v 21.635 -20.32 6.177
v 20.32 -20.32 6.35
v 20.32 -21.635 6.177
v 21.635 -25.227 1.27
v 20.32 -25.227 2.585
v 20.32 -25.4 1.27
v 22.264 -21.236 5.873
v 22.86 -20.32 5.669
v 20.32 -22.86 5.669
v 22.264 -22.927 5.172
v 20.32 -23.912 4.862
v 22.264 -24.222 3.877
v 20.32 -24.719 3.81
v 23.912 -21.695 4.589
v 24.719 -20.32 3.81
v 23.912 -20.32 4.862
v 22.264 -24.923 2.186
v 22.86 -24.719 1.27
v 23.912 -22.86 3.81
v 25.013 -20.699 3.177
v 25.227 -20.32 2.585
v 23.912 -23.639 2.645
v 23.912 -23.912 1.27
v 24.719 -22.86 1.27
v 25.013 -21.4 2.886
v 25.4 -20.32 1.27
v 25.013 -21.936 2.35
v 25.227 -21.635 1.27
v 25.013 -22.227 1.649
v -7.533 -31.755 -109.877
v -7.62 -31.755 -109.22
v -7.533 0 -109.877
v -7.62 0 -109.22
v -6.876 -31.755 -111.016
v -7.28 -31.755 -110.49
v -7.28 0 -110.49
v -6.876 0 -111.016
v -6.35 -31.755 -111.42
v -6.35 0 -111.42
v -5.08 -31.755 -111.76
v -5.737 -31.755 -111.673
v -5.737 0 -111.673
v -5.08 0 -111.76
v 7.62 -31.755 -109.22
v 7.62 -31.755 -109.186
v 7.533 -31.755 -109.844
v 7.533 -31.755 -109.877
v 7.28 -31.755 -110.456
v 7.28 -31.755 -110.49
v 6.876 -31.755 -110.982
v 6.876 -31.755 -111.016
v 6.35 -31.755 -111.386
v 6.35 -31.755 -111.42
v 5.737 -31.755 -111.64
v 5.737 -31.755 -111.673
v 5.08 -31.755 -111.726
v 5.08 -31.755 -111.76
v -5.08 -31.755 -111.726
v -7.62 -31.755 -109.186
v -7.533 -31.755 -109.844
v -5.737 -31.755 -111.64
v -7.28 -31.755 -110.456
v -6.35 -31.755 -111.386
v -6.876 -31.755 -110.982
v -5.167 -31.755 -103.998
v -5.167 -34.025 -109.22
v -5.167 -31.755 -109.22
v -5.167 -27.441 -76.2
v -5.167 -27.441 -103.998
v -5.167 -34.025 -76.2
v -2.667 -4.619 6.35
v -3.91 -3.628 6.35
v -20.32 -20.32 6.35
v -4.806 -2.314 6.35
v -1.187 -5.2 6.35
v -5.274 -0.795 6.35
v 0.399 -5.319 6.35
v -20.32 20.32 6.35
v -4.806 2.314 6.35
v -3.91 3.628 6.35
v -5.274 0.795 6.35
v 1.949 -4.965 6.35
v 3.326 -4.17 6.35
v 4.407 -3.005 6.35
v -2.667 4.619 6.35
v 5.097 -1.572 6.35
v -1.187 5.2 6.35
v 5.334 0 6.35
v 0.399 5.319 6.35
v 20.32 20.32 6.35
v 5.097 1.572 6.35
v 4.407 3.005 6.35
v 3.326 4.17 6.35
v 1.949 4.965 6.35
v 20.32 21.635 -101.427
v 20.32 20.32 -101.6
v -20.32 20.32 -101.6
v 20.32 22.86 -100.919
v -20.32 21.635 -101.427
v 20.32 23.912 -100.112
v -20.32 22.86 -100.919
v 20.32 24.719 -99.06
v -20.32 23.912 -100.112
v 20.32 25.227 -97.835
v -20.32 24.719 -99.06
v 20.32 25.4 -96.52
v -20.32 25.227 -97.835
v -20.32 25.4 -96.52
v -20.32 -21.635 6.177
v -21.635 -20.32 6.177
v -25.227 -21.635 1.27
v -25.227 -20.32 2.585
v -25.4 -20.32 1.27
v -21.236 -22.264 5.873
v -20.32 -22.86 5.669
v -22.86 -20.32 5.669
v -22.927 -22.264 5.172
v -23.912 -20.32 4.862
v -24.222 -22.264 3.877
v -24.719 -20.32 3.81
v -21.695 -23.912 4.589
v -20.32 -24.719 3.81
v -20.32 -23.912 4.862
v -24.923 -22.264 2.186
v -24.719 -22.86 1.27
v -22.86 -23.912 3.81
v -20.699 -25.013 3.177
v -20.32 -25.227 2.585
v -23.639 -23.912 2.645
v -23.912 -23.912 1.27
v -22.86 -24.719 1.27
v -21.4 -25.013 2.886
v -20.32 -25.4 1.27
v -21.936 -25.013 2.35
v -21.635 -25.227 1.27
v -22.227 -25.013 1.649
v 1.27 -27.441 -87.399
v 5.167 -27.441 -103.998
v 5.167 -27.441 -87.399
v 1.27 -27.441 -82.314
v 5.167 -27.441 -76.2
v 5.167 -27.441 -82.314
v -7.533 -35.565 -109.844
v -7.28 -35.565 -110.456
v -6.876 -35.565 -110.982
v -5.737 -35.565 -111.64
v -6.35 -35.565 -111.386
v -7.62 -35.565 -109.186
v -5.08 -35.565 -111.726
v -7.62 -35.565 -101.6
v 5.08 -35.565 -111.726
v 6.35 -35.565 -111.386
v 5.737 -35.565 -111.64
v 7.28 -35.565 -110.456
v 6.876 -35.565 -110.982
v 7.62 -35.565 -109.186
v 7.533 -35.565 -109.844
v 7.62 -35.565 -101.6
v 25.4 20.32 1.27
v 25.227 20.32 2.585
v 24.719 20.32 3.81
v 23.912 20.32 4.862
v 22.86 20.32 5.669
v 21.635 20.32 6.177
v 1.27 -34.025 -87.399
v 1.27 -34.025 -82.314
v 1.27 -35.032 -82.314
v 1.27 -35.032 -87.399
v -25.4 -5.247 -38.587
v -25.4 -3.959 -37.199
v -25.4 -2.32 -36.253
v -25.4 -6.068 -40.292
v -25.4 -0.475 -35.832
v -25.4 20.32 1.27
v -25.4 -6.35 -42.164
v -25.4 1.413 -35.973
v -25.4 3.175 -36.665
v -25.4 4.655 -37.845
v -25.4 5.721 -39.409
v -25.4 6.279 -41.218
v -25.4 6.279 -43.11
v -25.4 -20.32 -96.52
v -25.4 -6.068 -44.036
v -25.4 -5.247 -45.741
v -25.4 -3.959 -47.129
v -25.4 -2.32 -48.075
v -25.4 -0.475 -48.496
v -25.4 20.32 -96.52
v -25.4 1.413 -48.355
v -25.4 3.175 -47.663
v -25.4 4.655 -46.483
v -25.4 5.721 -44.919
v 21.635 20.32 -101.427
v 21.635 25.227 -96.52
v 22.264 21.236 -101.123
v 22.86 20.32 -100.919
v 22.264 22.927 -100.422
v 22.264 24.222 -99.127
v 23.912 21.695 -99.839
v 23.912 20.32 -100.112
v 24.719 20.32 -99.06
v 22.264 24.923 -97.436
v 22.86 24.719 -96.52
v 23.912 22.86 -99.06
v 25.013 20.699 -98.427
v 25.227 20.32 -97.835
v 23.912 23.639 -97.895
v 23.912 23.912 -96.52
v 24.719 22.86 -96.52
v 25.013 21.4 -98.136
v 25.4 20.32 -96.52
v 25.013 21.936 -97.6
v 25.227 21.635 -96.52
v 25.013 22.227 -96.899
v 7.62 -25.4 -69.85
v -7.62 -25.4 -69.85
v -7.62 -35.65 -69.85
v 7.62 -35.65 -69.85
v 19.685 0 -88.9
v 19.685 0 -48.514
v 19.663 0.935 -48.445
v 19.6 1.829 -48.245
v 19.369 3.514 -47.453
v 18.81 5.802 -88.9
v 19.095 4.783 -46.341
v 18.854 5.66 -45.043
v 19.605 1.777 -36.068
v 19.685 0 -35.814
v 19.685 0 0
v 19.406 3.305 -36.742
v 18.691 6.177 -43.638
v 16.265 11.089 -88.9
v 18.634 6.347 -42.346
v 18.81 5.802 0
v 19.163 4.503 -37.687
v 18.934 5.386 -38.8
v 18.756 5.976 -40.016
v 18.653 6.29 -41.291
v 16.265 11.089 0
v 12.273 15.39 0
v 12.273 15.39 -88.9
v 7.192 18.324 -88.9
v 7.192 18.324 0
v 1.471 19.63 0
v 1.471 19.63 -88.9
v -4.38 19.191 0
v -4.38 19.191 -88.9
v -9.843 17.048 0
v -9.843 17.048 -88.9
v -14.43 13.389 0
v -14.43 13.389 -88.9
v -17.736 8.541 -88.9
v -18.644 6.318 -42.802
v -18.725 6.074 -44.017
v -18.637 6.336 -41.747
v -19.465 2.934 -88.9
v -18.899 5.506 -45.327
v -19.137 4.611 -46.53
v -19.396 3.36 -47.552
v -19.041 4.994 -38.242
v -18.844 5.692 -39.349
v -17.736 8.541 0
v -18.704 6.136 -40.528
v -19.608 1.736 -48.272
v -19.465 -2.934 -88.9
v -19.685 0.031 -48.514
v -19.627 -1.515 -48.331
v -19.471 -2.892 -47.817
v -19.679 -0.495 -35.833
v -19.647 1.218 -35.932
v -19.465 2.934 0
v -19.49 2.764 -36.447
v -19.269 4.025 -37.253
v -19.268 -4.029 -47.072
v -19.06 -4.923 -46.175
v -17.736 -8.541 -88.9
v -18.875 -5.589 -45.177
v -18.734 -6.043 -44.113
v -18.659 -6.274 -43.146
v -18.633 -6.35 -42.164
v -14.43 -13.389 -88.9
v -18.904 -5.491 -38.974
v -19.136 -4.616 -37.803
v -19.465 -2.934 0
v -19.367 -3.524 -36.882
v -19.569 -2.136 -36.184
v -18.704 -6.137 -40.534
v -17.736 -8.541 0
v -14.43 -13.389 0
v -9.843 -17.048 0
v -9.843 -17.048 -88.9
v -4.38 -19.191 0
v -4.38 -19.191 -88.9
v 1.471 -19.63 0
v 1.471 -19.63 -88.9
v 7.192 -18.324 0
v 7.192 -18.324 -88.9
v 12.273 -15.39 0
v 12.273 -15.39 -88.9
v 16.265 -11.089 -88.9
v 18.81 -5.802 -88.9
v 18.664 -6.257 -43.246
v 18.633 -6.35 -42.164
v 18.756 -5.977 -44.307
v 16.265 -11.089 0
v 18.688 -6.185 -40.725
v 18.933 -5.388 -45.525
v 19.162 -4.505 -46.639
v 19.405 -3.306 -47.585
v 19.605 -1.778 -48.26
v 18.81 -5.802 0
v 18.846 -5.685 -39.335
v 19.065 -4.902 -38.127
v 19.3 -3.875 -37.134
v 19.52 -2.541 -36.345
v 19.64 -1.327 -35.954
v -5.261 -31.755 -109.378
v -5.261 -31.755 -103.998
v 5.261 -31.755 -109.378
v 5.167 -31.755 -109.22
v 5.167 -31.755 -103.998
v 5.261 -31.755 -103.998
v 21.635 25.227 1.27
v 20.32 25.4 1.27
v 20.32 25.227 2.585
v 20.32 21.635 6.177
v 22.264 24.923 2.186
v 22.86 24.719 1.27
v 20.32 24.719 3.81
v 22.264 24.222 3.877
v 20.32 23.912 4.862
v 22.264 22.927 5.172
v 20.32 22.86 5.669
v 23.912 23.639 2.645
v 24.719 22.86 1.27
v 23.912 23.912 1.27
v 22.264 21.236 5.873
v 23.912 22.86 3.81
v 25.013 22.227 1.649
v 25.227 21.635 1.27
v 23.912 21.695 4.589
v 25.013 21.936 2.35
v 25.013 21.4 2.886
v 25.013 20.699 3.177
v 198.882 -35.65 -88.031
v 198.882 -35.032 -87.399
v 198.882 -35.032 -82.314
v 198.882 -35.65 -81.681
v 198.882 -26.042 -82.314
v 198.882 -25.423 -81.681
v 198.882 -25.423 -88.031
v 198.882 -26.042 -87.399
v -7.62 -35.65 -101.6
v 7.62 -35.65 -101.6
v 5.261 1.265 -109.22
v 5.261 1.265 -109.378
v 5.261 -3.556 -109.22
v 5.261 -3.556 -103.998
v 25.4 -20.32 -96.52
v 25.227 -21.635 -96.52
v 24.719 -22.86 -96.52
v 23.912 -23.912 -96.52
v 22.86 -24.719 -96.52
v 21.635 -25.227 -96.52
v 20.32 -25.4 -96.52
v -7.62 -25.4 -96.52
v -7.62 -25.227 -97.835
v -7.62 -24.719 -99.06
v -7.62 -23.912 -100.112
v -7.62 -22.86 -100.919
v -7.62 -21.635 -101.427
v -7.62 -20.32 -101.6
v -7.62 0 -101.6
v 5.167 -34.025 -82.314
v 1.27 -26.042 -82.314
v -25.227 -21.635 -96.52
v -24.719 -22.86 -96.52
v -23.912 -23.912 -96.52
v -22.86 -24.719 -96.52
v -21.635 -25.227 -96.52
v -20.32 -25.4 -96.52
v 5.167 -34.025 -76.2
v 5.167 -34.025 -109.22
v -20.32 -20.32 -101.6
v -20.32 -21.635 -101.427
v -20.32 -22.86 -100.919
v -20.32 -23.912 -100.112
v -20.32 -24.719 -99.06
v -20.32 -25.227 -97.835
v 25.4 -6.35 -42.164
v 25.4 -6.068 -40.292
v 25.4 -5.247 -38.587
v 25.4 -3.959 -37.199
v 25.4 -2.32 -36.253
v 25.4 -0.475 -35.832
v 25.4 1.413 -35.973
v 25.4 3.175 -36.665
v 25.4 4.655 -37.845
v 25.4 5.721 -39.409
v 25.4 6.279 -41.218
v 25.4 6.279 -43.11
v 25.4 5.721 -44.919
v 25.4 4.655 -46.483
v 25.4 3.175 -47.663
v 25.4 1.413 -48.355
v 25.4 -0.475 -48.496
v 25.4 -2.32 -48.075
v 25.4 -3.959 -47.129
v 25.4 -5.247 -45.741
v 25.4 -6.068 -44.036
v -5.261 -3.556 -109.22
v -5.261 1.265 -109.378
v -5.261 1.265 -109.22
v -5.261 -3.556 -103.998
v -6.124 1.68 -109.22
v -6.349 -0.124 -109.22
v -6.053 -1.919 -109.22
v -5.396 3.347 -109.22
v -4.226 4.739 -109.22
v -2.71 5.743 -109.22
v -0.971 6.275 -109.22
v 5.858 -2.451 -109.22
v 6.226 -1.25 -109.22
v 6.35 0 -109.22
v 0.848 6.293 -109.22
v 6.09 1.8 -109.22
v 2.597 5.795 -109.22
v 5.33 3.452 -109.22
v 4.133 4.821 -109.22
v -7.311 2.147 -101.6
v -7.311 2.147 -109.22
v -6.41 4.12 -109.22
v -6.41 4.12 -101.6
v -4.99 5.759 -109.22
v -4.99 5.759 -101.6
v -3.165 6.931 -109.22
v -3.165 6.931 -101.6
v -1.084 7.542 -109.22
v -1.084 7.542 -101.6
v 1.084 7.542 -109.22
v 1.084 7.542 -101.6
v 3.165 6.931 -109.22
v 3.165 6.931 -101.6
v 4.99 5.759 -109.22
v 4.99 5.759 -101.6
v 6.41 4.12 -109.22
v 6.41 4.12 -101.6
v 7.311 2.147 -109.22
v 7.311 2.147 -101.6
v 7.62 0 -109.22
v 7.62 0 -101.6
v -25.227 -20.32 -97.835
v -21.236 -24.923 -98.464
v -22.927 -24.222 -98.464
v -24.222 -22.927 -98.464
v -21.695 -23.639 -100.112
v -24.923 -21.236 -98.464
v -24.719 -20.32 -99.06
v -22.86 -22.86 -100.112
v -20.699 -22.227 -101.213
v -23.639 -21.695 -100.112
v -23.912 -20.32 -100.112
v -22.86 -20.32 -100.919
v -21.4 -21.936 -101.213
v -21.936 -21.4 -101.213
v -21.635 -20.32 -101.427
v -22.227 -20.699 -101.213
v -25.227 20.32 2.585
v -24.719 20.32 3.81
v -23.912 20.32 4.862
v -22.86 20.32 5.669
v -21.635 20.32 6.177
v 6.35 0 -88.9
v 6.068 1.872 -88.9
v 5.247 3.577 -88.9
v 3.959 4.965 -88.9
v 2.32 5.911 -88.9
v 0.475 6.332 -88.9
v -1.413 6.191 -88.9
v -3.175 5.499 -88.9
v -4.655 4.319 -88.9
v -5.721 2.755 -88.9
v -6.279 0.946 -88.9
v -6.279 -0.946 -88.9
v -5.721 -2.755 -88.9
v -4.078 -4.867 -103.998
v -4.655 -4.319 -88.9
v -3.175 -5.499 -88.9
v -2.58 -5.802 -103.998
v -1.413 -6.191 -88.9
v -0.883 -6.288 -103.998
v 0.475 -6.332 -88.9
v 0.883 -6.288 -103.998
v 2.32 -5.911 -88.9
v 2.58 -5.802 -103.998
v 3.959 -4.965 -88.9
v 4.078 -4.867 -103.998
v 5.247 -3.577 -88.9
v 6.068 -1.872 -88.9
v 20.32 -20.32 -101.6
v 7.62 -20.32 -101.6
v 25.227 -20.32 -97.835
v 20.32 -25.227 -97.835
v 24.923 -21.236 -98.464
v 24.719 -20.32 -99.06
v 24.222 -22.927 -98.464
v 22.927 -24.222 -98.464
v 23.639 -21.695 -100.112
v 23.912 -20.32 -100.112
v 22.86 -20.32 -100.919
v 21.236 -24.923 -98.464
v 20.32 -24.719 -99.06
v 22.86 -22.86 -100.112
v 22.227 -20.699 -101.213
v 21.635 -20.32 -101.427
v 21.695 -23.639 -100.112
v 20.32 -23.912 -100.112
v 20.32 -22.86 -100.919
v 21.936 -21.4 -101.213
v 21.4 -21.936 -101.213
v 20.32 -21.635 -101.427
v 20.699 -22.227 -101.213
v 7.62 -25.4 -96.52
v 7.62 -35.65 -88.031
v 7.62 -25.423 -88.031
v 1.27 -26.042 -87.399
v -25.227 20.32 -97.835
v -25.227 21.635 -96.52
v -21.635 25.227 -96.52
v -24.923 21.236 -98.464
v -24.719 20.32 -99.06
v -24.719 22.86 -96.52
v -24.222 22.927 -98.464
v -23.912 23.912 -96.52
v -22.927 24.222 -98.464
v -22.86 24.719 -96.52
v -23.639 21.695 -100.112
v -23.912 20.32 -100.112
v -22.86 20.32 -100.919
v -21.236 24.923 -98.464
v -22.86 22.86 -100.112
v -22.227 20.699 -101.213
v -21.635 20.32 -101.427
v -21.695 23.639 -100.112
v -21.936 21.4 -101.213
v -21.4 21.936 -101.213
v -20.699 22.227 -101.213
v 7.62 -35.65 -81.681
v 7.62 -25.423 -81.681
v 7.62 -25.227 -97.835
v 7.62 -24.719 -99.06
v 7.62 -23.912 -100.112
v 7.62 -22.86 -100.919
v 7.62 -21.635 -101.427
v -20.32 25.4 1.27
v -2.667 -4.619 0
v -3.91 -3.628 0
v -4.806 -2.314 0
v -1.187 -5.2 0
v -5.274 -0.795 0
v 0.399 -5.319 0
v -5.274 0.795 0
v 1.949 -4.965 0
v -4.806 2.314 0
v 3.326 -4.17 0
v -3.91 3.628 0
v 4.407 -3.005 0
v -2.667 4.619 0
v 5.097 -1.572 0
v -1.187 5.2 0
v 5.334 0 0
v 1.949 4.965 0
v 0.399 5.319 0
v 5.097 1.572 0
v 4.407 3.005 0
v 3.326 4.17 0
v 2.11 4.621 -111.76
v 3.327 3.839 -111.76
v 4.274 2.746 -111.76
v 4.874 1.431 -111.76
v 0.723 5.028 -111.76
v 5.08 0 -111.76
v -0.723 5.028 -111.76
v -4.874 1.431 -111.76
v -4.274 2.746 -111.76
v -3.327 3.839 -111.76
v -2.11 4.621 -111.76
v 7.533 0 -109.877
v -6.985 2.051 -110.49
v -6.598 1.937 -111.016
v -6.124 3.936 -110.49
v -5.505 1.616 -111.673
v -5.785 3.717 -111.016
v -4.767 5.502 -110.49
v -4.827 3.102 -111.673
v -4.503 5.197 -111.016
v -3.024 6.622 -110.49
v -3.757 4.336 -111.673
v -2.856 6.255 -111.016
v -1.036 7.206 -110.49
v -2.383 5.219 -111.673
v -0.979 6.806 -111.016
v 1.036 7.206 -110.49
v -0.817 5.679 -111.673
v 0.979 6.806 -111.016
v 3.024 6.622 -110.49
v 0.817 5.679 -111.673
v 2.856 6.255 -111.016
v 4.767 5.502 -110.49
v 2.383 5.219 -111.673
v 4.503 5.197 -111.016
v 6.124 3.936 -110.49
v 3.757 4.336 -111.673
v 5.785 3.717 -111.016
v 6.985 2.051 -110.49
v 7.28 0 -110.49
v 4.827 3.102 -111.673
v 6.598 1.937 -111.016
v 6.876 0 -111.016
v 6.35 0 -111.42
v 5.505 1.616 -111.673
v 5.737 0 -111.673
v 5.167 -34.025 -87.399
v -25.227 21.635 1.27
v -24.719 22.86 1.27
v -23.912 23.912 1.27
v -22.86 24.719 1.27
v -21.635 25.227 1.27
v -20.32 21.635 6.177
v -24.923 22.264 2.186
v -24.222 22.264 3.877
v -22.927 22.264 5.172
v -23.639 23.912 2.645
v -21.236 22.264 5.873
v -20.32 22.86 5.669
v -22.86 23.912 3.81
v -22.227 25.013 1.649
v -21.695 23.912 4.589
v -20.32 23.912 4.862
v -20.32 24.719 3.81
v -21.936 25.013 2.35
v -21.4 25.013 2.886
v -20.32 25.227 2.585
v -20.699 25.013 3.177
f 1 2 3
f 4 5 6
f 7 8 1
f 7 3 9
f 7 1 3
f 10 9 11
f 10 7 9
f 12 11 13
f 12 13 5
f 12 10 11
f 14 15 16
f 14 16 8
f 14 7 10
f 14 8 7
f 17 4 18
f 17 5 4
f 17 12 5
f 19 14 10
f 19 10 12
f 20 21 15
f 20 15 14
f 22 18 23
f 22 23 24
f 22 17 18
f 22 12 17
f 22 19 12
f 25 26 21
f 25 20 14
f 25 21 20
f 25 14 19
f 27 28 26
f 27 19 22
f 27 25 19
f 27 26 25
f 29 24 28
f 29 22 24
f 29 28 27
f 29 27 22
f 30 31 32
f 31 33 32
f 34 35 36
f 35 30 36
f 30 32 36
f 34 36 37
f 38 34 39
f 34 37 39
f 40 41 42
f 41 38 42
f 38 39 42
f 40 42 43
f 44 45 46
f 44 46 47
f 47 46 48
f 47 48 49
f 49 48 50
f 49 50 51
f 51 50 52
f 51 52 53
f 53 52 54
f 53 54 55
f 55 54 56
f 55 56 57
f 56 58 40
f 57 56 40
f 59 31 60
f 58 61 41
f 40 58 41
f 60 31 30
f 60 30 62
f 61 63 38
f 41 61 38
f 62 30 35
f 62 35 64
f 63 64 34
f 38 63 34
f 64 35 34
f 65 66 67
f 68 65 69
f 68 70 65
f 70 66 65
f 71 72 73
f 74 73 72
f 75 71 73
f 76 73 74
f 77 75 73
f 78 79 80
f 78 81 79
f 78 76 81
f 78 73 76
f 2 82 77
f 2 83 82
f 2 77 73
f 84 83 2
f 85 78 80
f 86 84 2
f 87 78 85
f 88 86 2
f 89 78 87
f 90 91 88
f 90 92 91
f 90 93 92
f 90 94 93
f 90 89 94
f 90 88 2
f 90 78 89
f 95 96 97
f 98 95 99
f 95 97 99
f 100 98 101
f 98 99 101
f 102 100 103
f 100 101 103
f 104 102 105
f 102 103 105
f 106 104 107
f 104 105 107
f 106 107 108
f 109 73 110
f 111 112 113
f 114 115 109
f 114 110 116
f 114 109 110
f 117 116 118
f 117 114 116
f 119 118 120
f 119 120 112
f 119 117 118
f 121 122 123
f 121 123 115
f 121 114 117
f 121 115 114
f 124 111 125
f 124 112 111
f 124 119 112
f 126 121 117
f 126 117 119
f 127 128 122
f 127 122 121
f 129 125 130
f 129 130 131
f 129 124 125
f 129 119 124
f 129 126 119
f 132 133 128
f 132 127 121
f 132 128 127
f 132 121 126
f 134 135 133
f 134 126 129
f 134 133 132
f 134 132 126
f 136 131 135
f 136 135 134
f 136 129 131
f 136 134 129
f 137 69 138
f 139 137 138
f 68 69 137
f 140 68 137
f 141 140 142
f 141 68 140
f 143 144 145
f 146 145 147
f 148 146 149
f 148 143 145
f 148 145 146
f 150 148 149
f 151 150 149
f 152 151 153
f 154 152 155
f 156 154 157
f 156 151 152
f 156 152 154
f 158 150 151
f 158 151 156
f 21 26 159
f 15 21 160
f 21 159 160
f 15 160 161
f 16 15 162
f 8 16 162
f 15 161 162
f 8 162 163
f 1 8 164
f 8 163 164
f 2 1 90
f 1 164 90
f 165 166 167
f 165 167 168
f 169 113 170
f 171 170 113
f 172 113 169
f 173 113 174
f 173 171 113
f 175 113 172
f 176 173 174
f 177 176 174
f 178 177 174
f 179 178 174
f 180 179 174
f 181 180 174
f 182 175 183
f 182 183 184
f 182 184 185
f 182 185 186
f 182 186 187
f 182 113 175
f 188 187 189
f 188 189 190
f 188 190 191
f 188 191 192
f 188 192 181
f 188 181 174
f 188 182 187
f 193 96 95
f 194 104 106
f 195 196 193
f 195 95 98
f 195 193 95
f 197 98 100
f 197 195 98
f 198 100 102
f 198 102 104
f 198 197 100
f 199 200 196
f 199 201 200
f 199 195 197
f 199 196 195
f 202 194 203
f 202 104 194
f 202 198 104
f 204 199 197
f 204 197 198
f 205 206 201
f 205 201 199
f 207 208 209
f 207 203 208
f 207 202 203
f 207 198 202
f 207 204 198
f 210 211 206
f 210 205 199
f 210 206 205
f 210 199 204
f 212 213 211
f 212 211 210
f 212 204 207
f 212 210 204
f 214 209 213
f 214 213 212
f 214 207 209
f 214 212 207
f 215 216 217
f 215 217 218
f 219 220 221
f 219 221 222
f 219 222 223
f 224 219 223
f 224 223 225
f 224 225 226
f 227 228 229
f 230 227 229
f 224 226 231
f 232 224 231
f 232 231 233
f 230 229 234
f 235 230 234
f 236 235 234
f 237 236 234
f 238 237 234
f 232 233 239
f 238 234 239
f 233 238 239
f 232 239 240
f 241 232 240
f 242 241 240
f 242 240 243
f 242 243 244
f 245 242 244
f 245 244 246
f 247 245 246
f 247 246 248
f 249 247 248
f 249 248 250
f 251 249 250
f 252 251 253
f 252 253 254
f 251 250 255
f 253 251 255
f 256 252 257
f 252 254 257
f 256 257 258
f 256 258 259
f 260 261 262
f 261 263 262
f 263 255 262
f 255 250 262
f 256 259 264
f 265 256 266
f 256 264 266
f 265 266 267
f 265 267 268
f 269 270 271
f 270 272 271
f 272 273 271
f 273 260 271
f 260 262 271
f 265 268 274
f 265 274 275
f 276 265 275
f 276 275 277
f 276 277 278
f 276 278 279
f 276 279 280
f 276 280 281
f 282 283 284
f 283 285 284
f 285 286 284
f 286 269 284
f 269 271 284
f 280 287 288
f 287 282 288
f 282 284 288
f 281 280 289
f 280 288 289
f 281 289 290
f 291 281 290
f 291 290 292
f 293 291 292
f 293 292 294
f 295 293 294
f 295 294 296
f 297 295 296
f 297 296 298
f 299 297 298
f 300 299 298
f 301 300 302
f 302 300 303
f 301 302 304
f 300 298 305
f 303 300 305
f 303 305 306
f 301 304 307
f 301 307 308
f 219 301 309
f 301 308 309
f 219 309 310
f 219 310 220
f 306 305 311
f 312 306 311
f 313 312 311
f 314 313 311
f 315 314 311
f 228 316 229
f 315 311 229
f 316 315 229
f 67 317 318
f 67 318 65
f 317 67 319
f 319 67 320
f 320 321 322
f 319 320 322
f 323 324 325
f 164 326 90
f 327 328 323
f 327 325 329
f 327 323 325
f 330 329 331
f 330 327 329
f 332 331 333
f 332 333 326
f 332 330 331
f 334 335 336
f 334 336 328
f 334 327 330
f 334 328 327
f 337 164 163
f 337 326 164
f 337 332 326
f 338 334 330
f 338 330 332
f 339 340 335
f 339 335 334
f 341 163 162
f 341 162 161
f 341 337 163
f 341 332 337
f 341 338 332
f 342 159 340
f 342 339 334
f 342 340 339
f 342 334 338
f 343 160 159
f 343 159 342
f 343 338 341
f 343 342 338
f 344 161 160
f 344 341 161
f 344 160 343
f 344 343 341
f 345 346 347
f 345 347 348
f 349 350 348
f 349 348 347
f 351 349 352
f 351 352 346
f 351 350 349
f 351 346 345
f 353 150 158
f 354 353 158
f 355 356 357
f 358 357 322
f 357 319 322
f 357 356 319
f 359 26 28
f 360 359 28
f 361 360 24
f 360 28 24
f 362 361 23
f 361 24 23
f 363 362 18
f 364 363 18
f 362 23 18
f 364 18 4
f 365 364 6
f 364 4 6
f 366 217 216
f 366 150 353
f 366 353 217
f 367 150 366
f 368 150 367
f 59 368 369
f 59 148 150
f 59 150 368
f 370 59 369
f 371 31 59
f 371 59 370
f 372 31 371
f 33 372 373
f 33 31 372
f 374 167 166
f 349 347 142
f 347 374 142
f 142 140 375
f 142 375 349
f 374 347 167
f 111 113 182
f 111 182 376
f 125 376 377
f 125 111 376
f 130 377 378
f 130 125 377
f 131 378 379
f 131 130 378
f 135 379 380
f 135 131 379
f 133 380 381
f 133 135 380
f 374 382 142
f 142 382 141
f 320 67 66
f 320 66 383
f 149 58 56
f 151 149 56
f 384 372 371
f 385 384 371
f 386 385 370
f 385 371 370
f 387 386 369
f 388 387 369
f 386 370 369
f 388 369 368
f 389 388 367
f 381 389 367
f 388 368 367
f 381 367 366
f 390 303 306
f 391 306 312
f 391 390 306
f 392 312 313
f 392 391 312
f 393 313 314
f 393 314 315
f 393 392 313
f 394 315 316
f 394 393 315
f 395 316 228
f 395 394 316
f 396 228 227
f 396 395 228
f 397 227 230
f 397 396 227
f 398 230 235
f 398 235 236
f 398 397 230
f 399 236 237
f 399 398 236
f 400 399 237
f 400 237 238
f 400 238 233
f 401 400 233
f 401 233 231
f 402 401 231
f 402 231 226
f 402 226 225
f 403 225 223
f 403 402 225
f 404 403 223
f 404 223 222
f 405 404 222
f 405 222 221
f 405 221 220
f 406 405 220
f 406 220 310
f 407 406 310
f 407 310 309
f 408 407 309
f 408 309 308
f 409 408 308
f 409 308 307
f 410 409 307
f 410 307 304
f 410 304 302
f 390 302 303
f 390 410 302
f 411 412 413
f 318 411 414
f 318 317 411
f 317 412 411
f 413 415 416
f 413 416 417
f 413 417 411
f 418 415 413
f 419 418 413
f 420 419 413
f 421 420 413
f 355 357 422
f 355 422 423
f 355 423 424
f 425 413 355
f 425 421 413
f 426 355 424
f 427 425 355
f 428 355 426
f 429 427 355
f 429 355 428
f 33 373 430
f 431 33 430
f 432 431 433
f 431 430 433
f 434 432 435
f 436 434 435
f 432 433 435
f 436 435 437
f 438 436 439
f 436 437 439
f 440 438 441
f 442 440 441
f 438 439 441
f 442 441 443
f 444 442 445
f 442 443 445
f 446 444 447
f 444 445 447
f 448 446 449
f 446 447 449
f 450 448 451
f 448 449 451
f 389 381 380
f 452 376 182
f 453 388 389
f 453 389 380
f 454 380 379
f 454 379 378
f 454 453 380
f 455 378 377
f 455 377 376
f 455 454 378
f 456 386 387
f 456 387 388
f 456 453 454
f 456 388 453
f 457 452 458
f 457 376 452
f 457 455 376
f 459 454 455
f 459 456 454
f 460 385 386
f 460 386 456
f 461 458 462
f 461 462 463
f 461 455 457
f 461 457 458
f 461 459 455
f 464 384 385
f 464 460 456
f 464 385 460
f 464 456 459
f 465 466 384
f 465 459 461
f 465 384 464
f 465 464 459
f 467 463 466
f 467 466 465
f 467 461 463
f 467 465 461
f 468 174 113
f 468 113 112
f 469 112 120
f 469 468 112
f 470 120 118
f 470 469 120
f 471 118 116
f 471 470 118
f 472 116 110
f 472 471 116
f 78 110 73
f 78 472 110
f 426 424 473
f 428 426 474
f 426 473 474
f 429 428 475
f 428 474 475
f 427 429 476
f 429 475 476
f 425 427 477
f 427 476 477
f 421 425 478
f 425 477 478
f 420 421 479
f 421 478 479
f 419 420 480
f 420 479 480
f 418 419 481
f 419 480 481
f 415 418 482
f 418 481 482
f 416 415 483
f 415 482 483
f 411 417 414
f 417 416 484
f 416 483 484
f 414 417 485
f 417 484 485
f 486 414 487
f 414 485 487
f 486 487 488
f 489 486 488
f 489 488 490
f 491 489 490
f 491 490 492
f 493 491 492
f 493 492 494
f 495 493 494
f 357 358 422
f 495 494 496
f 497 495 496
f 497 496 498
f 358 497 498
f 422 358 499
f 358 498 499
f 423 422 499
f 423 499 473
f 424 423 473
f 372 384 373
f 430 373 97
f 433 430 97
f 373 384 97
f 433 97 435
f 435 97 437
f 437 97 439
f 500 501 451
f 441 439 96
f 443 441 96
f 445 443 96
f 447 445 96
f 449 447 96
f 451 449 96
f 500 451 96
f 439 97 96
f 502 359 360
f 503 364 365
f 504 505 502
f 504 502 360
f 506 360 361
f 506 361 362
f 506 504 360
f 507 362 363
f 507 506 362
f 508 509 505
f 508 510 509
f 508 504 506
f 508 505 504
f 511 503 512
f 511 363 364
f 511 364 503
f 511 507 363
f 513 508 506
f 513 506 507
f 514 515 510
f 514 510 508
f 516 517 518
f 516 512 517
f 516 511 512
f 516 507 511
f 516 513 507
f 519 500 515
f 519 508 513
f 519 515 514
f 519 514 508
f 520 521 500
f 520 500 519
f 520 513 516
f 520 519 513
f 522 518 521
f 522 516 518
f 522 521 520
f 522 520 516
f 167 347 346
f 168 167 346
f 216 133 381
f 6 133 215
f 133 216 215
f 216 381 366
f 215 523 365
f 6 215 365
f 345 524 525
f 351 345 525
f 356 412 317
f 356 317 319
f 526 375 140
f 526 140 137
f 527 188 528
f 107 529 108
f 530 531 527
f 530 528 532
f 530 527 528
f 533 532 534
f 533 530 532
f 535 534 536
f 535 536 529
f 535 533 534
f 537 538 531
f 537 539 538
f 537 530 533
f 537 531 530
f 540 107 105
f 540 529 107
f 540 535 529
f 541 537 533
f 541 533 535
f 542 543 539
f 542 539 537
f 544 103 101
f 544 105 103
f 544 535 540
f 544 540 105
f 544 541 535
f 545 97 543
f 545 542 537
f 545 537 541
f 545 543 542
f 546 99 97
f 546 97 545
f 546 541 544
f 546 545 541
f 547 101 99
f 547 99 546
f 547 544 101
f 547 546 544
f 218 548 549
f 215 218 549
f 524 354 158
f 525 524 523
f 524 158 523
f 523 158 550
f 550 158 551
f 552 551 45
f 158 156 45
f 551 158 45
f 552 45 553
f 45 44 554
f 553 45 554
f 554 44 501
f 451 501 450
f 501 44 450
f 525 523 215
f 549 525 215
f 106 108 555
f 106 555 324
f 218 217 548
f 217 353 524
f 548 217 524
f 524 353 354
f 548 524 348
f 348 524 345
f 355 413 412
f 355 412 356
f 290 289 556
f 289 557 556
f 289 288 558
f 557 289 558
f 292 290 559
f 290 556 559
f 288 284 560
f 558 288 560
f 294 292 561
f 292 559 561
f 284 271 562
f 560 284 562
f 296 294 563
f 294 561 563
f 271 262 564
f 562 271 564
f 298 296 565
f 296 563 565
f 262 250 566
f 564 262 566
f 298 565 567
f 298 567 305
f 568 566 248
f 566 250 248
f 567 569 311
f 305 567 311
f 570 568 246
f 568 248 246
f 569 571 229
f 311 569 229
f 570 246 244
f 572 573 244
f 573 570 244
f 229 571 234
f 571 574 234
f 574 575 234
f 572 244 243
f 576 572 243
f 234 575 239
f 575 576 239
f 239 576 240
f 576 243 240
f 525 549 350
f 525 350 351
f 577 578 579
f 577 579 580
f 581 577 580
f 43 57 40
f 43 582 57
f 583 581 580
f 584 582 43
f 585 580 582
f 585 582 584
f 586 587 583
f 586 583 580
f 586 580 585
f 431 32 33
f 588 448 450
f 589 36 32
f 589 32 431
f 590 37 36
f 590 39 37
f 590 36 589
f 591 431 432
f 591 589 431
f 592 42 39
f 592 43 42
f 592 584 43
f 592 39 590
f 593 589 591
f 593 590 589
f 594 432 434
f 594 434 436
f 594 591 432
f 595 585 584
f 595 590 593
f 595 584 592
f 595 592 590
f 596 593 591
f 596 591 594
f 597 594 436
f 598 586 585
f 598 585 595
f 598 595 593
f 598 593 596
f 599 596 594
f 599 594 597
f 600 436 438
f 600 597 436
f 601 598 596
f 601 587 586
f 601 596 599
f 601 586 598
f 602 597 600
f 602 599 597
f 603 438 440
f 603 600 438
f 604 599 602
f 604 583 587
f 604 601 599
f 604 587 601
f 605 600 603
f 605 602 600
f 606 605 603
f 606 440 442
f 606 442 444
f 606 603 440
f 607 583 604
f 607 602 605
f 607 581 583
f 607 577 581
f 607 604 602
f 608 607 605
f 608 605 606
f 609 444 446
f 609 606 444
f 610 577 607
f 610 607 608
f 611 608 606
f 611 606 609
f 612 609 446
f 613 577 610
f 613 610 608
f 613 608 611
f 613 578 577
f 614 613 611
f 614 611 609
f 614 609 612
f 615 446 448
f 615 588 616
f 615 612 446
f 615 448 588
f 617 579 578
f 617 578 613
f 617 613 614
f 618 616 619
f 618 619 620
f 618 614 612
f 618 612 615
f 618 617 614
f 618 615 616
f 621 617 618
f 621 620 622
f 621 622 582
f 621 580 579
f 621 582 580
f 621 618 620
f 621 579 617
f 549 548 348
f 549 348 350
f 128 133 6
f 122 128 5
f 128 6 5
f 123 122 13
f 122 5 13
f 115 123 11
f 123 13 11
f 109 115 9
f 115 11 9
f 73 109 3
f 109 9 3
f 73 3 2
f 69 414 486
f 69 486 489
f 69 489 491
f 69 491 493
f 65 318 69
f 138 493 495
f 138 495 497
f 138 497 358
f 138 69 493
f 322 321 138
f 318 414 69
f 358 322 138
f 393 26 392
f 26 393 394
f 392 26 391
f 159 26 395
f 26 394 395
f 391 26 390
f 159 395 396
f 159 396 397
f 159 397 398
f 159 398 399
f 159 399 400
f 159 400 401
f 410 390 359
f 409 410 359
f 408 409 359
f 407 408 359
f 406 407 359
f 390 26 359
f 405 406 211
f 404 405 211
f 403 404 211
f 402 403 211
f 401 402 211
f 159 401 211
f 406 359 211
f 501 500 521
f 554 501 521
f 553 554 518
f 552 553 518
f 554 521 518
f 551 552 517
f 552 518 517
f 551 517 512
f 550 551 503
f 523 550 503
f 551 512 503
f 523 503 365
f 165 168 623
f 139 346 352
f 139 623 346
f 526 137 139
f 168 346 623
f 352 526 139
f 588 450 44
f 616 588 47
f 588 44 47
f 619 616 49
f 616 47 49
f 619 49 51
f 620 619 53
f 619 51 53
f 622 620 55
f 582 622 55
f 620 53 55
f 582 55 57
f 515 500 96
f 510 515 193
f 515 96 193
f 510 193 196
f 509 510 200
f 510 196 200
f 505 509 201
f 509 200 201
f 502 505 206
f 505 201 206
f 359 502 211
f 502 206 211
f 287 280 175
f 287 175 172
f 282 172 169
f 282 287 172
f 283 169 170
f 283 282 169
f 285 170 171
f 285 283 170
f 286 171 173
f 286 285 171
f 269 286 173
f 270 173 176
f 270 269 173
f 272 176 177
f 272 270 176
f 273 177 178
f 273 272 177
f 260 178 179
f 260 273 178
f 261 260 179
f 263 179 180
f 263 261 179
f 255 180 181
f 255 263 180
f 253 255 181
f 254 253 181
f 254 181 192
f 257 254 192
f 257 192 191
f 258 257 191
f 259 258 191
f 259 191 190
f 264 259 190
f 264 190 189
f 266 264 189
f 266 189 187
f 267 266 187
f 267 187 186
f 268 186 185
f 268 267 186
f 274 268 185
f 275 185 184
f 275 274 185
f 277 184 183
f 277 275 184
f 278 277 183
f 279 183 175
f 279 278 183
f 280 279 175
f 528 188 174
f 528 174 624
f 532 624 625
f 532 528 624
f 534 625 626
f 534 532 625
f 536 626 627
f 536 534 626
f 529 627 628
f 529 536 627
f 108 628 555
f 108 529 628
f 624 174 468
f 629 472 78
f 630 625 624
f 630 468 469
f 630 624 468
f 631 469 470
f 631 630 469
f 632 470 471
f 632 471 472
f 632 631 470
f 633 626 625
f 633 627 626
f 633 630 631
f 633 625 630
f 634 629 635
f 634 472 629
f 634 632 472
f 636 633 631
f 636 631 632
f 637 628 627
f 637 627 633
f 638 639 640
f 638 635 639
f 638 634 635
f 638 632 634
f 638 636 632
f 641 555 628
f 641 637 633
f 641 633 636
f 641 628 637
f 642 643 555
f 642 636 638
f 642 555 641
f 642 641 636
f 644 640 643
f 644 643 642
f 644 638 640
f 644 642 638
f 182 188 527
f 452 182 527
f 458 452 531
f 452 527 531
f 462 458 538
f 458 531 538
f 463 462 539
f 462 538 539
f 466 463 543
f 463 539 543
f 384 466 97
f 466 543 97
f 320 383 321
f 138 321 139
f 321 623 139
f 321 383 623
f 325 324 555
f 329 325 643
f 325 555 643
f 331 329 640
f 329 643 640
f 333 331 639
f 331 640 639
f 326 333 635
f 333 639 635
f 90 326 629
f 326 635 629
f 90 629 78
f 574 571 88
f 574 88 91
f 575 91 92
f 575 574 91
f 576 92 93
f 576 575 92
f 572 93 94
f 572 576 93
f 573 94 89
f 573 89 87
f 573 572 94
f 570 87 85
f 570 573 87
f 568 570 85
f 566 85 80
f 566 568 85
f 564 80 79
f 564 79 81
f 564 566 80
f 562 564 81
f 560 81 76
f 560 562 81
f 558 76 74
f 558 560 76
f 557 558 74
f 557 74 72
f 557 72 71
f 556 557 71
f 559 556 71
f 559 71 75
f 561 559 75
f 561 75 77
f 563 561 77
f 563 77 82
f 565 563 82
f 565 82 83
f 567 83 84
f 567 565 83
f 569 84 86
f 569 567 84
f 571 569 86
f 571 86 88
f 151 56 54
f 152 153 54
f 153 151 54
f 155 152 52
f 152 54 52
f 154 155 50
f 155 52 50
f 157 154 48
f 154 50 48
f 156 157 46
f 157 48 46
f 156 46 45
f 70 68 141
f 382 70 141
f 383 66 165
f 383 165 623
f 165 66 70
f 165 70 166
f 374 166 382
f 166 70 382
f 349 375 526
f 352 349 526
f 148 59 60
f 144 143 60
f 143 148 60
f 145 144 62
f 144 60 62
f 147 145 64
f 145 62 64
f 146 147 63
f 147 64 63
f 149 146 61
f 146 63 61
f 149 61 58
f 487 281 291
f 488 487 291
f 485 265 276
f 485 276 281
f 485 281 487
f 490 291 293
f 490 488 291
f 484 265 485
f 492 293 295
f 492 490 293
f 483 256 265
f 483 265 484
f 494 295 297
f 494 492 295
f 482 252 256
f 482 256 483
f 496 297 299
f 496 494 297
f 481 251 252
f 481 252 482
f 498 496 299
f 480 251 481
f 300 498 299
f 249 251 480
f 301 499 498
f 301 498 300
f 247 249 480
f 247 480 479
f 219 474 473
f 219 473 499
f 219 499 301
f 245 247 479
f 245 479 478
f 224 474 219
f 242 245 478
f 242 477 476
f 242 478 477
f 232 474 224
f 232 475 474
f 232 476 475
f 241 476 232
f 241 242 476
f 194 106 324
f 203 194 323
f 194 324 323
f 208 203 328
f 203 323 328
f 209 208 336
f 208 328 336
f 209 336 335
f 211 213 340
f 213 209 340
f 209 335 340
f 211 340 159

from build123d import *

# Parameters (mm, degrees)
SKETCH1_W               = 50.8
SKETCH1_H               = 50.8
BOSS_EXTRUDE1_DEPTH     = 101.6
SKETCH3_R               = 19.685
CUT_EXTRUDE1_DEPTH      = 88.9
BOSS_EXTRUDE2_DEPTH     = 10.16
SKETCH11_R              = 6.35
CUT_EXTRUDE3_DEPTH      = 20.32
SKETCH13_W              = 50.8
SKETCH13_H              = 50.8
SKETCH13_R              = 5.334
BOSS_EXTRUDE4_DEPTH     = 6.35
FILLET2_R               = 5.08
FILLET5_R               = 2.54
CUT_EXTRUDE5_DEPTH      = 127.804196843
CUT_EXTRUDE5_DEPTH_BACK = 127.804196843
SKETCH14_R              = 6.35
FILLET8_R               = 5.08
FILLET10_R              = 5.08
FILLET11_R              = 5.08
FILLET12_R              = 5.08
FILLET13_R              = 5.08
SKETCH16_W              = 10.522080148
SKETCH16_H              = 5.380343577
CUT_EXTRUDE6_DEPTH      = 33.02
SKETCH23_W              = 15.24
SKETCH23_H              = 10.12633605
BOSS_EXTRUDE8_DEPTH     = 3.81
FILLET18_R              = 2.54
FILLET19_R              = 2.54
SKETCH24_W              = 15.24
SKETCH24_H              = 10.250014382
BOSS_EXTRUDE9_DEPTH     = 25.4
SKETCH25_W              = 10.33413659
SKETCH25_H              = 6.58364474
CUT_EXTRUDE9_DEPTH      = 33.02
SKETCH26_W              = 15.24
SKETCH26_H              = 10.250014382
BOSS_EXTRUDE10_DEPTH    = 6.35
SKETCH27_W              = 6.35
SKETCH27_H              = 10.22652942
SKETCH27_W_2            = 5.084647905
SKETCH27_H_2            = 8.990346269
BOSS_EXTRUDE11_DEPTH    = 191.262
SKETCH28_W              = 5.084647905
SKETCH28_H              = 8.990346269
CUT_EXTRUDE10_DEPTH     = 6.35


with BuildPart() as part:
    # Sketch1 → Boss-Extrude1 (new body)
    with BuildSketch(Plane.XY):
        Rectangle(SKETCH1_W, SKETCH1_H)
    extrude(amount=-BOSS_EXTRUDE1_DEPTH)

    # Sketch3 → Cut-Extrude1 (cut)
    with BuildSketch(Plane.XY):
        Circle(SKETCH3_R)
    extrude(amount=-CUT_EXTRUDE1_DEPTH, mode=Mode.SUBTRACT)

    # Sketch6 → Boss-Extrude2 (add)
    with BuildSketch(Plane(origin=(0, 0, -101.6), x_dir=(-1, 0, 0), z_dir=(0, 0, -1))):
        with BuildLine():
            Line((-7.62, 0), (-7.62, -25.404790774))
            Line((-7.62, -25.404790774), (-7.62, -31.754790774))
            Line((-7.62, -31.754790774), (7.62, -31.754790774))
            Line((7.62, -31.754790774), (7.62, -25.404790774))
            Line((7.62, -25.404790774), (7.62, 0))
            ThreePointArc((7.62, 0), (0, 7.62), (-7.62, 0))
        make_face()
    extrude(amount=BOSS_EXTRUDE2_DEPTH)

    # Sketch11 → Cut-Extrude3 (cut)
    with BuildSketch(Plane.XY.offset(-88.9)):
        Circle(SKETCH11_R)
    extrude(amount=-CUT_EXTRUDE3_DEPTH, mode=Mode.SUBTRACT)

    # Sketch13 → Boss-Extrude4 (add)
    with BuildSketch(Plane.XY):
        Rectangle(SKETCH13_W, SKETCH13_H)
        Circle(SKETCH13_R, mode=Mode.SUBTRACT)
    extrude(amount=BOSS_EXTRUDE4_DEPTH)

    # Fillet2
    fillet2_edges = [part.edges().sort_by_distance(p)[0] for p in [
        (-25.4, 0, -101.6),
        (-25.4, 0, 6.35),
        (-25.4, -25.4, -47.625),
        (-25.4, 25.4, -47.625),
    ]]
    fillet(fillet2_edges, radius=FILLET2_R)

    # Fillet5
    fillet5_edges = [part.edges().sort_by_distance(p)[0] for p in [
        (0, 7.62, -111.76),
        (7.62, -15.877395387, -111.76),
        (-7.62, -15.877395387, -111.76),
    ]]
    fillet(fillet5_edges, radius=FILLET5_R)

    # Sketch14 → Cut-Extrude5 (cut, two sides: drawn at the far end of the back side and taken through both)
    with BuildSketch(Plane.ZY.offset(25.4).offset(-CUT_EXTRUDE5_DEPTH_BACK)):
        with Locations(Location((-42.164, 0, 0), (0, 0, 270))):
            Circle(SKETCH14_R)
    extrude(amount=CUT_EXTRUDE5_DEPTH + CUT_EXTRUDE5_DEPTH_BACK, mode=Mode.SUBTRACT)

    # Fillet8
    # the kernel refuses this fillet: 5.08 mm, written as the material it takes off along each edge
    with BuildSketch(Plane(origin=(-20.32, -20.32, 1.27), x_dir=(0, 0, 1), z_dir=(0, -1, 0))) as fillet8_piece_1_section:
        Polygon((0, 0), (FILLET8_R, 0), (FILLET8_R, FILLET8_R), (0, FILLET8_R), align=None)
    fillet8_piece_1 = extrude(amount=FILLET8_R, mode=Mode.PRIVATE)
    fillet8_piece_1 = fillet8_piece_1 - Plane(origin=(-20.32, -20.32, 1.27), x_dir=(0.7071067811865475, 0, -0.7071067811865475), z_dir=(0, -1, 0)) * Sphere(FILLET8_R, mode=Mode.PRIVATE)
    add(fillet8_piece_1, mode=Mode.SUBTRACT)
    with BuildSketch(Plane(origin=(-20.32, 20.32, -96.52), x_dir=(0, 1, 0), z_dir=(0, 0, -1))) as fillet8_piece_2_section:
        Polygon((0, 0), (FILLET8_R, 0), (FILLET8_R, -FILLET8_R), (0, -FILLET8_R), align=None)
    fillet8_piece_2 = extrude(amount=FILLET8_R, mode=Mode.PRIVATE)
    fillet8_piece_2 = fillet8_piece_2 - Plane(origin=(-20.32, 20.32, -96.52), x_dir=(0.7071067811865476, -0.7071067811865475, 0), z_dir=(0, 0, -1)) * Sphere(FILLET8_R, mode=Mode.PRIVATE)
    add(fillet8_piece_2, mode=Mode.SUBTRACT)
    with BuildSketch(Plane(origin=(25.4, 38.1, -101.6), x_dir=(-1, 0, 0), z_dir=(0, -1, 0))) as fillet8_piece_3:
        with BuildLine():
            CenterArc((FILLET8_R, -FILLET8_R), FILLET8_R, 90, 90)
            Line((0, -FILLET8_R), (0, 0))
            Line((0, 0), (FILLET8_R, 0))
        make_face()
    extrude(amount=76.2, mode=Mode.SUBTRACT)
    with BuildSketch(Plane(origin=(38.1, -25.4, 6.35), x_dir=(0, 0, -1), z_dir=(-1, 0, 0)), Plane(origin=(-20.32, 25.4, -101.6), x_dir=(0, -1, 0), z_dir=(1, 0, 0))) as fillet8_piece_4:
        with BuildLine():
            CenterArc((FILLET8_R, -FILLET8_R), FILLET8_R, 90, 90)
            Line((0, -FILLET8_R), (0, 0))
            Line((0, 0), (FILLET8_R, 0))
        make_face()
    extrude(amount=58.42, mode=Mode.SUBTRACT)
    with BuildSketch(Plane(origin=(25.4, -25.4, 19.05), x_dir=(-1, 0, 0), z_dir=(0, 0, -1))) as fillet8_piece_5:
        with BuildLine():
            CenterArc((FILLET8_R, FILLET8_R), FILLET8_R, 180, 90)
            Line((0, FILLET8_R), (0, 0))
            Line((0, 0), (FILLET8_R, 0))
        make_face()
    extrude(amount=133.35, mode=Mode.SUBTRACT)

    # Fillet10
    # the kernel refuses this fillet: 5.08 mm, written as the material it takes off along each edge
    with BuildSketch(Plane(origin=(20.32, -20.32, 1.27), x_dir=(0, 0, 1), z_dir=(1, 0, 0))) as fillet10_piece_1_section:
        Polygon((0, 0), (FILLET10_R, 0), (FILLET10_R, FILLET10_R), (0, FILLET10_R), align=None)
    fillet10_piece_1 = extrude(amount=FILLET10_R, mode=Mode.PRIVATE)
    fillet10_piece_1 = fillet10_piece_1 - Plane(origin=(20.32, -20.32, 1.27), x_dir=(0, 0.7071067811865475, -0.7071067811865475), z_dir=(1, 0, 0)) * Sphere(FILLET10_R, mode=Mode.PRIVATE)
    add(fillet10_piece_1, mode=Mode.SUBTRACT)
    with BuildSketch(Plane(origin=(-20.32, 20.32, 1.27), x_dir=(0, 0, 1), z_dir=(0, 1, 0))) as fillet10_piece_2_section:
        Polygon((0, 0), (FILLET10_R, 0), (FILLET10_R, -FILLET10_R), (0, -FILLET10_R), align=None)
    fillet10_piece_2 = extrude(amount=FILLET10_R, mode=Mode.PRIVATE)
    fillet10_piece_2 = fillet10_piece_2 - Plane(origin=(-20.32, 20.32, 1.27), x_dir=(0.7071067811865475, 0, -0.7071067811865475), z_dir=(0, 1, 0)) * Sphere(FILLET10_R, mode=Mode.PRIVATE)
    add(fillet10_piece_2, mode=Mode.SUBTRACT)
    with BuildSketch(Plane(origin=(-20.32, 25.4, 6.35), x_dir=(0, 0, -1), z_dir=(1, 0, 0)), Plane(origin=(25.4, 38.1, 6.35), x_dir=(0, 0, -1), z_dir=(0, -1, 0))) as fillet10_piece_3:
        with BuildLine():
            CenterArc((FILLET10_R, -FILLET10_R), FILLET10_R, 90, 90)
            Line((0, -FILLET10_R), (0, 0))
            Line((0, 0), (FILLET10_R, 0))
        make_face()
    extrude(amount=58.42, mode=Mode.SUBTRACT)

    # Fillet11
    # the kernel refuses this fillet: 5.08 mm, written as the material it takes off along each edge
    with BuildSketch(Plane(origin=(20.32, 20.32, -96.52), x_dir=(0, 1, 0), z_dir=(1, 0, 0))) as fillet11_piece_1_section:
        Polygon((0, 0), (FILLET11_R, 0), (FILLET11_R, -FILLET11_R), (0, -FILLET11_R), align=None)
    fillet11_piece_1 = extrude(amount=FILLET11_R, mode=Mode.PRIVATE)
    fillet11_piece_1 = fillet11_piece_1 - Plane(origin=(20.32, 20.32, -96.52), x_dir=(0, -0.7071067811865475, 0.7071067811865475), z_dir=(1, 0, 0)) * Sphere(FILLET11_R, mode=Mode.PRIVATE)
    add(fillet11_piece_1, mode=Mode.SUBTRACT)
    with BuildSketch(Plane(origin=(20.32, 20.32, 1.27), x_dir=(0, 1, 0), z_dir=(1, 0, 0))) as fillet11_piece_2_section:
        Polygon((0, 0), (FILLET11_R, 0), (FILLET11_R, FILLET11_R), (0, FILLET11_R), align=None)
    fillet11_piece_2 = extrude(amount=FILLET11_R, mode=Mode.PRIVATE)
    fillet11_piece_2 = fillet11_piece_2 - Plane(origin=(20.32, 20.32, 1.27), x_dir=(0, -0.7071067811865475, -0.7071067811865475), z_dir=(1, 0, 0)) * Sphere(FILLET11_R, mode=Mode.PRIVATE)
    add(fillet11_piece_2, mode=Mode.SUBTRACT)
    with BuildSketch(Plane(origin=(25.4, 25.4, 1.27), x_dir=(0, -1, 0), z_dir=(0, 0, -1))) as fillet11_piece_3:
        with BuildLine():
            CenterArc((FILLET11_R, FILLET11_R), FILLET11_R, 180, 90)
            Line((0, FILLET11_R), (0, 0))
            Line((0, 0), (FILLET11_R, 0))
        make_face()
    extrude(amount=97.79, mode=Mode.SUBTRACT)

    # Fillet12
    # the kernel refuses this fillet: 5.08 mm, written as the material it takes off along each edge
    with BuildSketch(Plane(origin=(-20.32, -20.32, -96.52), x_dir=(0, -1, 0), z_dir=(0, 0, -1))) as fillet12_piece_1_section:
        Polygon((0, 0), (FILLET12_R * 1.02, 0), (FILLET12_R * 1.02, FILLET12_R * 1.02), (0, FILLET12_R * 1.02), align=None)
    fillet12_piece_1 = extrude(amount=FILLET12_R * 1.02, mode=Mode.PRIVATE)
    fillet12_piece_1 = fillet12_piece_1 - Plane(origin=(-20.32, -20.32, -96.52), x_dir=(0.7071067811865475, 0.7071067811865477, 0), z_dir=(0, 0, -1)) * Sphere(FILLET12_R, mode=Mode.PRIVATE)
    add(fillet12_piece_1, mode=Mode.SUBTRACT)
    with BuildSketch(Plane(origin=(-7.62, -25.4, -101.6), x_dir=(0, 1, 0), z_dir=(-1, 0, 0))) as fillet12_piece_2:
        with BuildLine():
            CenterArc((FILLET12_R, -FILLET12_R), FILLET12_R, 90, 90)
            Line((0, -FILLET12_R), (0, 0))
            Line((0, 0), (FILLET12_R, 0))
        make_face()
    extrude(amount=12.7, mode=Mode.SUBTRACT)

    # Fillet13
    # the kernel refuses this fillet: 5.08 mm, written as the material it takes off along each edge
    with BuildSketch(Plane(origin=(20.32, -20.32, -96.52), x_dir=(0, -1, 0), z_dir=(0, 0, -1))) as fillet13_piece_1_section:
        Polygon((0, 0), (FILLET13_R * 1.02, 0), (FILLET13_R * 1.02, -FILLET13_R * 1.02), (0, -FILLET13_R * 1.02), align=None)
    fillet13_piece_1 = extrude(amount=FILLET13_R * 1.02, mode=Mode.PRIVATE)
    fillet13_piece_1 = fillet13_piece_1 - Plane(origin=(20.32, -20.32, -96.52), x_dir=(-0.7071067811865476, 0.7071067811865475, 0), z_dir=(0, 0, -1)) * Sphere(FILLET13_R, mode=Mode.PRIVATE)
    add(fillet13_piece_1, mode=Mode.SUBTRACT)
    with BuildSketch(Plane(origin=(20.32, -25.4, -101.6), x_dir=(0, 1, 0), z_dir=(-1, 0, 0))) as fillet13_piece_2:
        with BuildLine():
            CenterArc((FILLET13_R, -FILLET13_R), FILLET13_R, 90, 90)
            Line((0, -FILLET13_R), (0, 0))
            Line((0, 0), (FILLET13_R, 0))
        make_face()
    extrude(amount=12.7, mode=Mode.SUBTRACT)

    # Sketch16 → Cut-Extrude6 (cut)
    with BuildSketch(Plane.XZ.offset(31.754790774)):
        with Locations((0, -106.687745086)):
            Rectangle(SKETCH16_W, SKETCH16_H)
    extrude(amount=-CUT_EXTRUDE6_DEPTH, mode=Mode.SUBTRACT)

    # Sketch23 → Boss-Extrude8 (add)
    with BuildSketch(Plane.XZ.offset(31.754790774)):
        with Locations((0, -106.663168025)):
            Rectangle(SKETCH23_W, SKETCH23_H)
    extrude(amount=BOSS_EXTRUDE8_DEPTH)

    # Fillet18
    # the kernel refuses this fillet: 2.54 mm, written as the material it takes off along each edge
    with BuildSketch(Plane(origin=(7.62, -31.754790774, -111.72633605), x_dir=(-1, 0, 0), z_dir=(0, -1, 0))) as fillet18_piece_1:
        with BuildLine():
            CenterArc((FILLET18_R, -FILLET18_R), FILLET18_R, 90, 90)
            Line((0, -FILLET18_R), (0, 0))
            Line((0, 0), (FILLET18_R, 0))
        make_face()
    extrude(amount=10.16, mode=Mode.SUBTRACT)

    # Fillet19
    # the kernel refuses this fillet: 2.54 mm, written as the material it takes off along each edge
    with BuildSketch(Plane(origin=(-7.62, -31.754790774, -111.72633605), x_dir=(0, 0, 1), z_dir=(0, -1, 0))) as fillet19_piece_1:
        with BuildLine():
            CenterArc((FILLET19_R, -FILLET19_R), FILLET19_R, 90, 90)
            Line((0, -FILLET19_R), (0, 0))
            Line((0, 0), (FILLET19_R, 0))
        make_face()
    extrude(amount=10.16, mode=Mode.SUBTRACT)

    # Sketch24 → Boss-Extrude9 (add)
    with BuildSketch(Plane.XY.offset(-101.6)):
        with Locations((0, -30.525007191)):
            Rectangle(SKETCH24_W, SKETCH24_H)
    extrude(amount=BOSS_EXTRUDE9_DEPTH)

    # Sketch25 → Cut-Extrude9 (cut)
    with BuildSketch(Plane.XY.offset(-76.2)):
        with Locations((0, -30.733312974)):
            Rectangle(SKETCH25_W, SKETCH25_H)
    extrude(amount=-CUT_EXTRUDE9_DEPTH, mode=Mode.SUBTRACT)

    # Sketch26 → Boss-Extrude10 (add)
    with BuildSketch(Plane.XY.offset(-76.2)):
        with Locations((0, -30.525007191)):
            Rectangle(SKETCH26_W, SKETCH26_H)
    extrude(amount=BOSS_EXTRUDE10_DEPTH)

    # Sketch27 → Boss-Extrude11 (add)
    with BuildSketch(Plane(origin=(7.62, 0, 0), x_dir=(0, 0, -1), z_dir=(1, 0, 0))):
        with Locations((84.856460364, -30.536749672)):
            Rectangle(SKETCH27_W, SKETCH27_H)
        with Locations((84.856460365, -30.536749672)):
            Rectangle(SKETCH27_W_2, SKETCH27_H_2, mode=Mode.SUBTRACT)
    extrude(amount=BOSS_EXTRUDE11_DEPTH)

    # Sketch28 → Cut-Extrude10 (cut)
    with BuildSketch(Plane(origin=(7.62, 0, 0), x_dir=(0, 0, -1), z_dir=(1, 0, 0))):
        with Locations((84.856460365, -30.536749672)):
            Rectangle(SKETCH28_W, SKETCH28_H)
    extrude(amount=-CUT_EXTRUDE10_DEPTH, mode=Mode.SUBTRACT)


solid = part.part
